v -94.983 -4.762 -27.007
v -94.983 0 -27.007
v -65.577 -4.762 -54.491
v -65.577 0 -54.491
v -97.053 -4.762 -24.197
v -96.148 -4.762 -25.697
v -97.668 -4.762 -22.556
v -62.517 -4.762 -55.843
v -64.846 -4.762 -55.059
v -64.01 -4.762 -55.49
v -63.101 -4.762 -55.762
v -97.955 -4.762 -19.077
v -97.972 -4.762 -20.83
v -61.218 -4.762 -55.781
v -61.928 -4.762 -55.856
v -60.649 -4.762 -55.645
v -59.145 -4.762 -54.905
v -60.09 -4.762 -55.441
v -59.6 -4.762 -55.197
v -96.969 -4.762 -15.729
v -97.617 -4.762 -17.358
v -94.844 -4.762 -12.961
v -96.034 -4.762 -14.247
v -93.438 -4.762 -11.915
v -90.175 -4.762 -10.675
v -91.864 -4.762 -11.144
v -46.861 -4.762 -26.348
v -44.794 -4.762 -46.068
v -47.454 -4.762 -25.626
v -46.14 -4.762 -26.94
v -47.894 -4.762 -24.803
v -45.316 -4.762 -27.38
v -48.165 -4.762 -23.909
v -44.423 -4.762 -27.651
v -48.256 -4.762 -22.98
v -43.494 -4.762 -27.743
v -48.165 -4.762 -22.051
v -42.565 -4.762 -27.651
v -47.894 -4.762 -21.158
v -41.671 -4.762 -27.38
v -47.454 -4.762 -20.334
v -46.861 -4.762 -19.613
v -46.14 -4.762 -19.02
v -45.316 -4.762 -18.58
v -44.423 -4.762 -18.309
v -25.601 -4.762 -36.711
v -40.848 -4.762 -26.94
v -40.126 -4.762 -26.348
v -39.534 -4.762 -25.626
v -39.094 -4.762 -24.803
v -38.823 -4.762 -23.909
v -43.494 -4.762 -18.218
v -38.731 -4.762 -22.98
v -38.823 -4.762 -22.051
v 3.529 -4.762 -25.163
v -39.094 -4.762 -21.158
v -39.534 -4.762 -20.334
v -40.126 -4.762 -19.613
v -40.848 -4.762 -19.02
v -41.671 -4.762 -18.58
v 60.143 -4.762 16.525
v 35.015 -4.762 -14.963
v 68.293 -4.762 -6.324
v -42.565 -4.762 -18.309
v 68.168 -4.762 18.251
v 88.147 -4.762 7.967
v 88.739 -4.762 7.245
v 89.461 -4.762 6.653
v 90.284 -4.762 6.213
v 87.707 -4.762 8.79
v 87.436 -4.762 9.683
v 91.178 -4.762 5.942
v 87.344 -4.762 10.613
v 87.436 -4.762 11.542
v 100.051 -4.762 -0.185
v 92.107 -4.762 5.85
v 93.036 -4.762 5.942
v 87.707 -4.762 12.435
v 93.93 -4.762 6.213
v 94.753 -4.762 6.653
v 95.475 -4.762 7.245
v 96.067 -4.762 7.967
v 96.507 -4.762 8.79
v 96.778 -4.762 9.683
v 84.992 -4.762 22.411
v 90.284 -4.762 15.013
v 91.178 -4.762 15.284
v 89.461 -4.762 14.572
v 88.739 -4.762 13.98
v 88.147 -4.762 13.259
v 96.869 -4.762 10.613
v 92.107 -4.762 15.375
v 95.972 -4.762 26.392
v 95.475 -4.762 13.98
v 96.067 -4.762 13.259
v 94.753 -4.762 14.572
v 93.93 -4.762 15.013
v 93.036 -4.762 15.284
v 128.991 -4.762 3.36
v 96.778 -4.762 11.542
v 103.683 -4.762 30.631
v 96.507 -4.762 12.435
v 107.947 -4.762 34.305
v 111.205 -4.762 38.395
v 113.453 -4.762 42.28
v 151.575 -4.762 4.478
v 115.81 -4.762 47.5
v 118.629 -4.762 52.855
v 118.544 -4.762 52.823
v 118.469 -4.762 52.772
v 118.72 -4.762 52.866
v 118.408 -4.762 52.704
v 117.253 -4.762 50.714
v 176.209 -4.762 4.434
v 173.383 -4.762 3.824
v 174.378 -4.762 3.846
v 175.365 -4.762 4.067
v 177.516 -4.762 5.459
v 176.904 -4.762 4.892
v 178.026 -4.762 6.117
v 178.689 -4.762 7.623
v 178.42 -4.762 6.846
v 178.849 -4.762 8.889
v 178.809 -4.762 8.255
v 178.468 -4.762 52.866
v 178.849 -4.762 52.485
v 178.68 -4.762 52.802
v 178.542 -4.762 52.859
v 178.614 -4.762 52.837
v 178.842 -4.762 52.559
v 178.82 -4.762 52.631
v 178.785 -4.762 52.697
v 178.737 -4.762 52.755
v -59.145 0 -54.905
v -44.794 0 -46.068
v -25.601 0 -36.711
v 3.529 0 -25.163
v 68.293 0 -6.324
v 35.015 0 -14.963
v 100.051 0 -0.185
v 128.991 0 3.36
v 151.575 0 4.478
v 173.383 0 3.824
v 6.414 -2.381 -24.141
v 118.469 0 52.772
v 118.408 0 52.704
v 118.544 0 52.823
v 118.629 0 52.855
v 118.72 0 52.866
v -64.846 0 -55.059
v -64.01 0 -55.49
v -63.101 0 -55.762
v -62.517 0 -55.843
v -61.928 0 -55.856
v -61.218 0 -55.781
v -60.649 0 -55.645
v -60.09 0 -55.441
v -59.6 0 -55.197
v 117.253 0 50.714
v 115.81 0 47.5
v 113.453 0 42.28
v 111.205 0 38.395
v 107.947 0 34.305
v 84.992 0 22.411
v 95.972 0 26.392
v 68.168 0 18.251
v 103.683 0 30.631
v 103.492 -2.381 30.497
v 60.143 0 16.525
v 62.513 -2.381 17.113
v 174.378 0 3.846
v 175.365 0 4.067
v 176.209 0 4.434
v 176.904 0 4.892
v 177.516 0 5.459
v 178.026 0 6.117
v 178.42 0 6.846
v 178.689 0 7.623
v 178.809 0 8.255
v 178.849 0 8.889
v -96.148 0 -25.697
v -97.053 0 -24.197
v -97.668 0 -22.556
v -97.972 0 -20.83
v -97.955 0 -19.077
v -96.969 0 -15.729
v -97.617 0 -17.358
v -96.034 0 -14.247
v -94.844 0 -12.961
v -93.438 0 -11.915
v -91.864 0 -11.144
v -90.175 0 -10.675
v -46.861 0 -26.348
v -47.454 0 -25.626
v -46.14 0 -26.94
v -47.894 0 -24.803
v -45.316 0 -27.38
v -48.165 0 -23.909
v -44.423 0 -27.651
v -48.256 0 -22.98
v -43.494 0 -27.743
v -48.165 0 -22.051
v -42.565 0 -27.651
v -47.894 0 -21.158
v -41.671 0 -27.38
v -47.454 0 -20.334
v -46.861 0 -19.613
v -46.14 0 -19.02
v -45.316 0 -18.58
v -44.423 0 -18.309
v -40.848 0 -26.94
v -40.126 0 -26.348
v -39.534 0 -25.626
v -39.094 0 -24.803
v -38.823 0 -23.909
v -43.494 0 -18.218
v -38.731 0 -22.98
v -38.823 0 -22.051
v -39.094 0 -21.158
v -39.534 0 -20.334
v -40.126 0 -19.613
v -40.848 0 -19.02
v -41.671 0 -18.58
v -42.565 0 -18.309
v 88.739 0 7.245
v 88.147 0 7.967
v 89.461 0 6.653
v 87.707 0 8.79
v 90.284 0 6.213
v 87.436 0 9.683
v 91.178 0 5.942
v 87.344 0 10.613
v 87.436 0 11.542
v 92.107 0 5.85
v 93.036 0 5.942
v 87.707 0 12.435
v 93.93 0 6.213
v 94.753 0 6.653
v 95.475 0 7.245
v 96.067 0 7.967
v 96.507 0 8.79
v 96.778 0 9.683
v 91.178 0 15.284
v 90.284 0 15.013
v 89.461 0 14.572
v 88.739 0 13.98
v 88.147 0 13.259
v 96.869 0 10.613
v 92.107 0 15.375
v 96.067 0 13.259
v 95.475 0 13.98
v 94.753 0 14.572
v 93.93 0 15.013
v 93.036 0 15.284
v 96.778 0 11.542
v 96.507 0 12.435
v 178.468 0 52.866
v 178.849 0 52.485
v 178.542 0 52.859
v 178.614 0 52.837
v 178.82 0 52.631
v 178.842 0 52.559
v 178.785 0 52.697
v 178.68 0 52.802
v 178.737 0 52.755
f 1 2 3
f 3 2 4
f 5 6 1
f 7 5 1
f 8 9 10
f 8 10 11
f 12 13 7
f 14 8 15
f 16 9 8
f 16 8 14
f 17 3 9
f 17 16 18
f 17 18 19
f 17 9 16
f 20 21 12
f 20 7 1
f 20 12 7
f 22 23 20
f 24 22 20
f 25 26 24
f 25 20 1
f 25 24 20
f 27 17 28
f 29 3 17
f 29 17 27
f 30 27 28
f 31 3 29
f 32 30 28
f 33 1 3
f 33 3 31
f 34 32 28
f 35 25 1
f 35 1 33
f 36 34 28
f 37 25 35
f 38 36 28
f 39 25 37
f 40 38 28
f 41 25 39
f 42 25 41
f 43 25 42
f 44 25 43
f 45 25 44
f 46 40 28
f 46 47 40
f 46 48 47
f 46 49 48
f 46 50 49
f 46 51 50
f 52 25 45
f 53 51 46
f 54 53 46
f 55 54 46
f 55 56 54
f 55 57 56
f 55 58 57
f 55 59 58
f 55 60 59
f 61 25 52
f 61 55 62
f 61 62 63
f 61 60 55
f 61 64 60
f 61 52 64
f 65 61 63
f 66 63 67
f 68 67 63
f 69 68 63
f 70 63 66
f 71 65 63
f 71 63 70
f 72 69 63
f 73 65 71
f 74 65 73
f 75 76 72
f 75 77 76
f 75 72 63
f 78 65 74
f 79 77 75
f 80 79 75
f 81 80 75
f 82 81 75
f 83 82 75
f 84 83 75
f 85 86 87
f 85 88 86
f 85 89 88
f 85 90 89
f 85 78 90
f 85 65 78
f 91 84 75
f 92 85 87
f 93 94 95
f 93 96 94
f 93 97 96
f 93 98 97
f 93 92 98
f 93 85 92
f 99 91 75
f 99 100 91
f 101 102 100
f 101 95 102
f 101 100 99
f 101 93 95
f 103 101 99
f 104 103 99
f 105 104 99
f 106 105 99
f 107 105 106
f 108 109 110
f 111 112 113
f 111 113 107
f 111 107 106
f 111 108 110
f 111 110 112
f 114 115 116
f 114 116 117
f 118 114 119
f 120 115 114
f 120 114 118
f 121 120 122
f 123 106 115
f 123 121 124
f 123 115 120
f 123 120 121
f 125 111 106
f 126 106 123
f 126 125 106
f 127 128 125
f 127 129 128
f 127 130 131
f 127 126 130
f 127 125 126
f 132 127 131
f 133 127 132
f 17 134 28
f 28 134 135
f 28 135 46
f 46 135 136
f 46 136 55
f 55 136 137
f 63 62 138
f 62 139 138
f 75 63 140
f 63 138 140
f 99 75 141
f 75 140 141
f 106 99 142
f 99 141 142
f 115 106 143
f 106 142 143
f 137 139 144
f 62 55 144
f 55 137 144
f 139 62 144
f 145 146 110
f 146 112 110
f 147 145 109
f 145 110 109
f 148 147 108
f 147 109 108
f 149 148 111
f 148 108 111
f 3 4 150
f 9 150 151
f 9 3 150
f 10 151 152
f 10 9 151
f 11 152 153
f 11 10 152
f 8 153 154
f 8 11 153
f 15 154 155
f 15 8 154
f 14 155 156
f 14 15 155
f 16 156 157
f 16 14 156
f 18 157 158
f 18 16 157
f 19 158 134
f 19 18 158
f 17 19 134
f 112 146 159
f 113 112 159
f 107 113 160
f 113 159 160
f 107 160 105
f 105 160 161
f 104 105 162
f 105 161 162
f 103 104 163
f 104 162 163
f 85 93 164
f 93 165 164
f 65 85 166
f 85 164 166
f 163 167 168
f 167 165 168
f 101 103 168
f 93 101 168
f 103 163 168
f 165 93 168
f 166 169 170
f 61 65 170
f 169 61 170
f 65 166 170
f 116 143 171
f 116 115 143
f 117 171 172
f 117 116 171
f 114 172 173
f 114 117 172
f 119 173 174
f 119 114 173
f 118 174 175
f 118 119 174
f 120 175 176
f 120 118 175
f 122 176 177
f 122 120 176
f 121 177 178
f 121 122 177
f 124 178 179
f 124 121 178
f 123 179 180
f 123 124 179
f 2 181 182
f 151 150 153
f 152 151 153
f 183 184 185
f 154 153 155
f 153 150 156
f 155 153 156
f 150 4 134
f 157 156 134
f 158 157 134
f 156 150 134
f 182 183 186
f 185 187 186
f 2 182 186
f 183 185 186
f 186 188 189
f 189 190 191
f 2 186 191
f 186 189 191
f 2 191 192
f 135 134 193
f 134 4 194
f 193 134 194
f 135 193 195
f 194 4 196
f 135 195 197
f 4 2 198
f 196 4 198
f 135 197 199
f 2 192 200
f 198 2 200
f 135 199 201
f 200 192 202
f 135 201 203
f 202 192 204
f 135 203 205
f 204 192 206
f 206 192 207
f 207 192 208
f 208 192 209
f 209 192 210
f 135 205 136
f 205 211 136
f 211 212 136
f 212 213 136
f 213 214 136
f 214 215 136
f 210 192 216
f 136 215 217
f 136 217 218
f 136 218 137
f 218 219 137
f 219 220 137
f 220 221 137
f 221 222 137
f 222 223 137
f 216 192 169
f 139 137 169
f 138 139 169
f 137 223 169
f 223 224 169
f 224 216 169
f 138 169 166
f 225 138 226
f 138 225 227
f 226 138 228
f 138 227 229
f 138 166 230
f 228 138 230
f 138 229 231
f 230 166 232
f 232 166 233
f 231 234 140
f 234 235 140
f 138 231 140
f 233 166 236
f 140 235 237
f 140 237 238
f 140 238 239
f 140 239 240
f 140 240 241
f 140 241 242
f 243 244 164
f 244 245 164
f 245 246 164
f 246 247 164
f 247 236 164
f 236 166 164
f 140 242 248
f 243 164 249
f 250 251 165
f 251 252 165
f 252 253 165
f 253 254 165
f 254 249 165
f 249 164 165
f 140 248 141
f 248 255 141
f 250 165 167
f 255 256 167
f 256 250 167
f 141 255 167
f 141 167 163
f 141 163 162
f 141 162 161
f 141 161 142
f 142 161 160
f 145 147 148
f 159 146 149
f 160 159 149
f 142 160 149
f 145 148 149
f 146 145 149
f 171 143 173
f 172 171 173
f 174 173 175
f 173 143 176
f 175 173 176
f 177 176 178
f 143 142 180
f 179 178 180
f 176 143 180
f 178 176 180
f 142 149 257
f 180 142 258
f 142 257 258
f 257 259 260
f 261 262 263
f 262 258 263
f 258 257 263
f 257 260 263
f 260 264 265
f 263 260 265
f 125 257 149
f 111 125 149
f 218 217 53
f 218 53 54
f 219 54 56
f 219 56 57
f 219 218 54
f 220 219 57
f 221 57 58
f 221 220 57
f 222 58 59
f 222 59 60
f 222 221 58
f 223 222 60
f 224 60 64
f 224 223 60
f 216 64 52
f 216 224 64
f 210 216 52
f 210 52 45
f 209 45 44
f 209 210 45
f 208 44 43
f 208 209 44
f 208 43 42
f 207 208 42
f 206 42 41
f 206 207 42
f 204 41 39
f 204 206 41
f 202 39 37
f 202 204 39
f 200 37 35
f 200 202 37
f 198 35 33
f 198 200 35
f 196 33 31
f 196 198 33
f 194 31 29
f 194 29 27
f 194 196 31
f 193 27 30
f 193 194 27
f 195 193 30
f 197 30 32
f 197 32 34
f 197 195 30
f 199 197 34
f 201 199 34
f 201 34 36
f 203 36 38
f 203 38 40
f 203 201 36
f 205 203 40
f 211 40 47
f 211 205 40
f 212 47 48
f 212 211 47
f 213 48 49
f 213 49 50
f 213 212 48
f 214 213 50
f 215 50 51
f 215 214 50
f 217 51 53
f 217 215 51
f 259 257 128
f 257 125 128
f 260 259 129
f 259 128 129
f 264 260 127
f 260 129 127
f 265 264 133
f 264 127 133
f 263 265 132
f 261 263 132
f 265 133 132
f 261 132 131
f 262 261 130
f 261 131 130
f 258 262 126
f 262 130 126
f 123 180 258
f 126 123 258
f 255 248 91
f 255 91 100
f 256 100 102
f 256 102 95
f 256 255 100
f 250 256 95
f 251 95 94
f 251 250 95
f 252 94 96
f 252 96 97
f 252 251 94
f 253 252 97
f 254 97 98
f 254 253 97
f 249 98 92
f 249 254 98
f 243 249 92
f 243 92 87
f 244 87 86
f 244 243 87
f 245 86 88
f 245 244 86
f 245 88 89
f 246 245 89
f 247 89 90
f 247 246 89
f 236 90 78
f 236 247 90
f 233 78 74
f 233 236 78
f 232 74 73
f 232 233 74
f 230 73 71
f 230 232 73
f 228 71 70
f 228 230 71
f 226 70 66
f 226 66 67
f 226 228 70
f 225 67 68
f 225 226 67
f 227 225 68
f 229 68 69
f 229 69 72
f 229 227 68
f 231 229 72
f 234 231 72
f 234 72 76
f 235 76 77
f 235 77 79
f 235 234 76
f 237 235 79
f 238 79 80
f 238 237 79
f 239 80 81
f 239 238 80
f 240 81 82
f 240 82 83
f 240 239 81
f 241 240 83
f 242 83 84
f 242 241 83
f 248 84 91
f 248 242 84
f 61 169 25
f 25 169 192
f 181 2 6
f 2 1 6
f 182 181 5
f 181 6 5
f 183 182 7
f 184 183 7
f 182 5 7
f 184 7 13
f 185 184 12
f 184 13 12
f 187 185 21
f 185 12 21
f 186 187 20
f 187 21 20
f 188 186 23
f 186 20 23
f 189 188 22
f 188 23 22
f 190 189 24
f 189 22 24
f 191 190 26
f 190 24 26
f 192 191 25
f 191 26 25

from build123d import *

# Parameters (mm, degrees)
F0_R     = 4.7625
F1_DEPTH = 4.7625
F2_R     = 5.08
F3_R     = 9.525
F4_R     = 0.381


with BuildPart() as f1:
    # F0 (on Front) → F1 (new body)
    with BuildSketch(Plane.XZ):
        with BuildLine():
            Line((60.1429268718, 16.5254306048), (-108.8427143228, -14.0530352161))
            Line((-108.8427143228, -14.0530352161), (-62.451031059, -57.4127137661))
            add(Edge.make_bspline(
                [(-62.451031059, -57.4127137661), (-50.1643598375, -47.5249055274), (10.3220797139, -17.4381564578), (123.773567881, 8.9901031394), (178.848968941, 3.3361169696)],
                knots=[0, 0, 0, 0, 0.398250962, 1, 1, 1, 1], degree=3))
            Line((178.848968941, 3.3361169696), (178.848968941, 52.8661169696))
            Line((178.848968941, 52.8661169696), (118.523968941, 52.8661169696))
            add(Edge.make_bspline(
                [(118.523968941, 52.8661169696), (115.1404463597, 48.2467955264), (112.3015113048, 24.068977806), (60.9008384489, 17.214194077), (60.1429268718, 16.5254306048)],
                knots=[0, 0, 0, 0, 0.4347885114, 1, 1, 1, 1], degree=3))
        make_face()
        with Locations((-43.4938967228, -22.9803621769)):
            Circle(F0_R, mode=Mode.SUBTRACT)
        with Locations((92.106996992, 10.612607679)):
            Circle(F0_R, mode=Mode.SUBTRACT)
    extrude(amount=F1_DEPTH)

    # F2
    f2_edges = [f1.edges().sort_by_distance(p)[0] for p in [
        (-62.451031, -2.38125, -57.412714),
        (178.848969, -2.38125, 3.336117),
    ]]
    fillet(f2_edges, radius=F2_R)

    # F3
    f3_edges = [f1.edges().sort_by_distance(p)[0] for p in [
        (-108.842714, -2.38125, -14.053035),
    ]]
    fillet(f3_edges, radius=F3_R)

    # F4
    f4_edges = [f1.edges().sort_by_distance(p)[0] for p in [
        (178.848969, -2.38125, 52.866117),
        (118.523969, -2.38125, 52.866117),
    ]]
    fillet(f4_edges, radius=F4_R)


solid = f1.part
